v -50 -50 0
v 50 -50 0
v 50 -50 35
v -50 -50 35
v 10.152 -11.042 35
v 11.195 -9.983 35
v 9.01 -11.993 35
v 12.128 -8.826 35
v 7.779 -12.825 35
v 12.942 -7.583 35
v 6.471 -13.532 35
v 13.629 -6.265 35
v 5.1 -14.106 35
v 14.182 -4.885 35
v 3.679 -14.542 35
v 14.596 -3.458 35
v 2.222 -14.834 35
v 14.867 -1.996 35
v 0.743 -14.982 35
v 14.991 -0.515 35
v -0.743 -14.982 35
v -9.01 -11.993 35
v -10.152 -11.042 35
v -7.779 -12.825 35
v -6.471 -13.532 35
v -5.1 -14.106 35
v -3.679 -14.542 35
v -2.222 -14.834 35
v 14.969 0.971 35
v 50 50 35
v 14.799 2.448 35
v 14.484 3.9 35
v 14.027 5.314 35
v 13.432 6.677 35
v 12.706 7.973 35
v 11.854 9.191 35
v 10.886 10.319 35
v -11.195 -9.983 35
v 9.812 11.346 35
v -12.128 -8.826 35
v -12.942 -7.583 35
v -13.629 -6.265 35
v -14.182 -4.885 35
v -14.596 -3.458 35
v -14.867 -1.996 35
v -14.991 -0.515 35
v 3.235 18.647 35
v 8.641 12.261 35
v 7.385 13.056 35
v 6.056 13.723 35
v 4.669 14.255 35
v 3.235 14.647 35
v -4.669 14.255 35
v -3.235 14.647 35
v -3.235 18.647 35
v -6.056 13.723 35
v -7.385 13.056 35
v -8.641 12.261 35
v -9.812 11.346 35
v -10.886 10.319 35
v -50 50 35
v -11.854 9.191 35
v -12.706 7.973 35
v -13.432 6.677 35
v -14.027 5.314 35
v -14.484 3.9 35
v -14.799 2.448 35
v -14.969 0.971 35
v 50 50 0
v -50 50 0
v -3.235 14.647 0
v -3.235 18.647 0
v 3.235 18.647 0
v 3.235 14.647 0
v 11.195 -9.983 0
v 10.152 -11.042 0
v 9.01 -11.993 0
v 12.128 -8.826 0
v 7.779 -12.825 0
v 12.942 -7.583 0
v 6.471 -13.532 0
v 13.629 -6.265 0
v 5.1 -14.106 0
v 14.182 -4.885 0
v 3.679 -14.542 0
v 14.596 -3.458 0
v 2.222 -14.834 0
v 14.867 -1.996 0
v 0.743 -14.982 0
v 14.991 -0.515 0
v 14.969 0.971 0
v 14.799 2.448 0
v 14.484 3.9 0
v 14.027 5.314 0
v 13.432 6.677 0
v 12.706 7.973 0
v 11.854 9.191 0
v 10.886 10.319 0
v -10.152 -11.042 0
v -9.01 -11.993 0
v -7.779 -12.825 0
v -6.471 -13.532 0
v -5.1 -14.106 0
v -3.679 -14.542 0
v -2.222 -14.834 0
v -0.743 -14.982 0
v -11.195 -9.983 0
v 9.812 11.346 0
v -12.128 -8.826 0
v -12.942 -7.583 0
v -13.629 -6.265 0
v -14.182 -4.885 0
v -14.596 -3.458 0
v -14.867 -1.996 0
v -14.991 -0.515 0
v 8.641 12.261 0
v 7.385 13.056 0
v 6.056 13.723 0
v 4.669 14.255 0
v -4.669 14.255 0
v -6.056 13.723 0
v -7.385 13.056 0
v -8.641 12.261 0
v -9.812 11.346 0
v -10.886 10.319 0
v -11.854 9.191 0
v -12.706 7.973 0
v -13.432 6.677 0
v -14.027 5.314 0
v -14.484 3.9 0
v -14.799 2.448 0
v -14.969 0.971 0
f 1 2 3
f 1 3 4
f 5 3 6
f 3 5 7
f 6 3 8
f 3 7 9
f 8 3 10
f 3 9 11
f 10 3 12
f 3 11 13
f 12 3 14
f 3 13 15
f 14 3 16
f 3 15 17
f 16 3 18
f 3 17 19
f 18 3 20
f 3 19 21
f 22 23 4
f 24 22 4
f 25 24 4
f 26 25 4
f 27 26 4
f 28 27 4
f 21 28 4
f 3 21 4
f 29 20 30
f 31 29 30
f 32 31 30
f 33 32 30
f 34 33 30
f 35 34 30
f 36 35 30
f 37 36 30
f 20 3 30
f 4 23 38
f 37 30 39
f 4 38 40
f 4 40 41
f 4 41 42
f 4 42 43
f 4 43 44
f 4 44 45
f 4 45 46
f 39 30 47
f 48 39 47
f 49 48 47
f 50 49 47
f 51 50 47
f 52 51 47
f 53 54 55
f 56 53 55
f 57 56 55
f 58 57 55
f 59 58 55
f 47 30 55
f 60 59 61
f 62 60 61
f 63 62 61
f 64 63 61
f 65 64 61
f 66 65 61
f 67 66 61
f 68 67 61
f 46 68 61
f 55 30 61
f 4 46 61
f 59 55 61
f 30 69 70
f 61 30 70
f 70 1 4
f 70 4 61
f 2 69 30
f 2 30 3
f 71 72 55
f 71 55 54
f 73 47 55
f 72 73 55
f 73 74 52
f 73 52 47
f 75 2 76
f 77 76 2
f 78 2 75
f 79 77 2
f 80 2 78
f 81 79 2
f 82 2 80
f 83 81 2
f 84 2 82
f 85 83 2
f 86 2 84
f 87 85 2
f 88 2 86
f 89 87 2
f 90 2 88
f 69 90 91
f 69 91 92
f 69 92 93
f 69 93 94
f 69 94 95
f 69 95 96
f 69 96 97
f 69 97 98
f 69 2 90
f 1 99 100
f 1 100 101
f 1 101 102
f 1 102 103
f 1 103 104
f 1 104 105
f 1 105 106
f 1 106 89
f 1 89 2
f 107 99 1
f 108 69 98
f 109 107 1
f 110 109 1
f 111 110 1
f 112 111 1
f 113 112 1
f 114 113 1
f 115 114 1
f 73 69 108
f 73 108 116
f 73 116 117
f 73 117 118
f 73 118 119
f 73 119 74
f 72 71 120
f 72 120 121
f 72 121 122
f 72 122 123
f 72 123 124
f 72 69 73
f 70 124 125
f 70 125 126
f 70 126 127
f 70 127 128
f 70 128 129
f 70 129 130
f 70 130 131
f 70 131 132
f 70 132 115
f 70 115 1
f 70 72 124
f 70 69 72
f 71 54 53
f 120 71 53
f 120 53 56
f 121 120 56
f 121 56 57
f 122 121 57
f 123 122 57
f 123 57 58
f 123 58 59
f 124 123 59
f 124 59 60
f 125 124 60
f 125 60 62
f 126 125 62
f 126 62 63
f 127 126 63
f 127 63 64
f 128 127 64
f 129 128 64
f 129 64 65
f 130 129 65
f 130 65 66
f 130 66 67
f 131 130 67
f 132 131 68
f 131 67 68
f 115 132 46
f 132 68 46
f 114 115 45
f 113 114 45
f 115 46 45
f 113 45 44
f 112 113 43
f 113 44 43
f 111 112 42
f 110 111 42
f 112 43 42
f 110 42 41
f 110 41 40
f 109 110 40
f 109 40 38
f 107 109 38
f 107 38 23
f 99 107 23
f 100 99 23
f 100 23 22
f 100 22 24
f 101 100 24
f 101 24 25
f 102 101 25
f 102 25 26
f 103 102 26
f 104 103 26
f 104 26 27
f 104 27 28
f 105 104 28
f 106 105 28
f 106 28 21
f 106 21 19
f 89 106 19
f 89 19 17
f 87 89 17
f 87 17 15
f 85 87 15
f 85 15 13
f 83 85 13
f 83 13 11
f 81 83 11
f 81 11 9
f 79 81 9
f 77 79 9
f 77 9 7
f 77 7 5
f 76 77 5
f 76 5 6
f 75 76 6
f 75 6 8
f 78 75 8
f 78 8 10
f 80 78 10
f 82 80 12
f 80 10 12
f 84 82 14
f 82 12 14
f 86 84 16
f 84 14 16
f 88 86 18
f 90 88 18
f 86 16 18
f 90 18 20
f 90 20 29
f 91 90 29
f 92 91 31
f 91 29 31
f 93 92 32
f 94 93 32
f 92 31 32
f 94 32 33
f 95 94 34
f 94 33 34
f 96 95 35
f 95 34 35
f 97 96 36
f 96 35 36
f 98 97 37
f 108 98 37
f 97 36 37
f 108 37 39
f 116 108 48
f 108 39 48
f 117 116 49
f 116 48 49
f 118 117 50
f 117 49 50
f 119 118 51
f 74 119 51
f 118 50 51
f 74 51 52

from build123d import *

# Parameters (mm, degrees)
BOSS_EXTRUDE1_DEPTH = 35
SKETCH2_R           = 15
CUT_EXTRUDE1_DEPTH  = 50


with BuildPart() as part:
    # Sketch1 → Boss-Extrude1 (new body)
    with BuildSketch(Plane.XY):
        Polygon((24.650973025, 50), (50, 50), (50, -50), (-50, -50), (-50, 50), align=None)
    extrude(amount=BOSS_EXTRUDE1_DEPTH)

    # Sketch2 → Cut-Extrude1 (cut)
    with BuildSketch(Plane.XY.offset(35)):
        Circle(SKETCH2_R)
        with BuildLine():
            Line((3.235, 18.647005667), (-3.235, 18.647005667))
            Line((-3.235, 18.647005667), (-3.235, 14.647005667))
            ThreePointArc((-3.235, 14.647005667), (0, 15), (3.235, 14.647005667))
            Line((3.235, 14.647005667), (3.235, 18.647005667))
        make_face()
    extrude(amount=-CUT_EXTRUDE1_DEPTH, mode=Mode.SUBTRACT)


solid = part.part
